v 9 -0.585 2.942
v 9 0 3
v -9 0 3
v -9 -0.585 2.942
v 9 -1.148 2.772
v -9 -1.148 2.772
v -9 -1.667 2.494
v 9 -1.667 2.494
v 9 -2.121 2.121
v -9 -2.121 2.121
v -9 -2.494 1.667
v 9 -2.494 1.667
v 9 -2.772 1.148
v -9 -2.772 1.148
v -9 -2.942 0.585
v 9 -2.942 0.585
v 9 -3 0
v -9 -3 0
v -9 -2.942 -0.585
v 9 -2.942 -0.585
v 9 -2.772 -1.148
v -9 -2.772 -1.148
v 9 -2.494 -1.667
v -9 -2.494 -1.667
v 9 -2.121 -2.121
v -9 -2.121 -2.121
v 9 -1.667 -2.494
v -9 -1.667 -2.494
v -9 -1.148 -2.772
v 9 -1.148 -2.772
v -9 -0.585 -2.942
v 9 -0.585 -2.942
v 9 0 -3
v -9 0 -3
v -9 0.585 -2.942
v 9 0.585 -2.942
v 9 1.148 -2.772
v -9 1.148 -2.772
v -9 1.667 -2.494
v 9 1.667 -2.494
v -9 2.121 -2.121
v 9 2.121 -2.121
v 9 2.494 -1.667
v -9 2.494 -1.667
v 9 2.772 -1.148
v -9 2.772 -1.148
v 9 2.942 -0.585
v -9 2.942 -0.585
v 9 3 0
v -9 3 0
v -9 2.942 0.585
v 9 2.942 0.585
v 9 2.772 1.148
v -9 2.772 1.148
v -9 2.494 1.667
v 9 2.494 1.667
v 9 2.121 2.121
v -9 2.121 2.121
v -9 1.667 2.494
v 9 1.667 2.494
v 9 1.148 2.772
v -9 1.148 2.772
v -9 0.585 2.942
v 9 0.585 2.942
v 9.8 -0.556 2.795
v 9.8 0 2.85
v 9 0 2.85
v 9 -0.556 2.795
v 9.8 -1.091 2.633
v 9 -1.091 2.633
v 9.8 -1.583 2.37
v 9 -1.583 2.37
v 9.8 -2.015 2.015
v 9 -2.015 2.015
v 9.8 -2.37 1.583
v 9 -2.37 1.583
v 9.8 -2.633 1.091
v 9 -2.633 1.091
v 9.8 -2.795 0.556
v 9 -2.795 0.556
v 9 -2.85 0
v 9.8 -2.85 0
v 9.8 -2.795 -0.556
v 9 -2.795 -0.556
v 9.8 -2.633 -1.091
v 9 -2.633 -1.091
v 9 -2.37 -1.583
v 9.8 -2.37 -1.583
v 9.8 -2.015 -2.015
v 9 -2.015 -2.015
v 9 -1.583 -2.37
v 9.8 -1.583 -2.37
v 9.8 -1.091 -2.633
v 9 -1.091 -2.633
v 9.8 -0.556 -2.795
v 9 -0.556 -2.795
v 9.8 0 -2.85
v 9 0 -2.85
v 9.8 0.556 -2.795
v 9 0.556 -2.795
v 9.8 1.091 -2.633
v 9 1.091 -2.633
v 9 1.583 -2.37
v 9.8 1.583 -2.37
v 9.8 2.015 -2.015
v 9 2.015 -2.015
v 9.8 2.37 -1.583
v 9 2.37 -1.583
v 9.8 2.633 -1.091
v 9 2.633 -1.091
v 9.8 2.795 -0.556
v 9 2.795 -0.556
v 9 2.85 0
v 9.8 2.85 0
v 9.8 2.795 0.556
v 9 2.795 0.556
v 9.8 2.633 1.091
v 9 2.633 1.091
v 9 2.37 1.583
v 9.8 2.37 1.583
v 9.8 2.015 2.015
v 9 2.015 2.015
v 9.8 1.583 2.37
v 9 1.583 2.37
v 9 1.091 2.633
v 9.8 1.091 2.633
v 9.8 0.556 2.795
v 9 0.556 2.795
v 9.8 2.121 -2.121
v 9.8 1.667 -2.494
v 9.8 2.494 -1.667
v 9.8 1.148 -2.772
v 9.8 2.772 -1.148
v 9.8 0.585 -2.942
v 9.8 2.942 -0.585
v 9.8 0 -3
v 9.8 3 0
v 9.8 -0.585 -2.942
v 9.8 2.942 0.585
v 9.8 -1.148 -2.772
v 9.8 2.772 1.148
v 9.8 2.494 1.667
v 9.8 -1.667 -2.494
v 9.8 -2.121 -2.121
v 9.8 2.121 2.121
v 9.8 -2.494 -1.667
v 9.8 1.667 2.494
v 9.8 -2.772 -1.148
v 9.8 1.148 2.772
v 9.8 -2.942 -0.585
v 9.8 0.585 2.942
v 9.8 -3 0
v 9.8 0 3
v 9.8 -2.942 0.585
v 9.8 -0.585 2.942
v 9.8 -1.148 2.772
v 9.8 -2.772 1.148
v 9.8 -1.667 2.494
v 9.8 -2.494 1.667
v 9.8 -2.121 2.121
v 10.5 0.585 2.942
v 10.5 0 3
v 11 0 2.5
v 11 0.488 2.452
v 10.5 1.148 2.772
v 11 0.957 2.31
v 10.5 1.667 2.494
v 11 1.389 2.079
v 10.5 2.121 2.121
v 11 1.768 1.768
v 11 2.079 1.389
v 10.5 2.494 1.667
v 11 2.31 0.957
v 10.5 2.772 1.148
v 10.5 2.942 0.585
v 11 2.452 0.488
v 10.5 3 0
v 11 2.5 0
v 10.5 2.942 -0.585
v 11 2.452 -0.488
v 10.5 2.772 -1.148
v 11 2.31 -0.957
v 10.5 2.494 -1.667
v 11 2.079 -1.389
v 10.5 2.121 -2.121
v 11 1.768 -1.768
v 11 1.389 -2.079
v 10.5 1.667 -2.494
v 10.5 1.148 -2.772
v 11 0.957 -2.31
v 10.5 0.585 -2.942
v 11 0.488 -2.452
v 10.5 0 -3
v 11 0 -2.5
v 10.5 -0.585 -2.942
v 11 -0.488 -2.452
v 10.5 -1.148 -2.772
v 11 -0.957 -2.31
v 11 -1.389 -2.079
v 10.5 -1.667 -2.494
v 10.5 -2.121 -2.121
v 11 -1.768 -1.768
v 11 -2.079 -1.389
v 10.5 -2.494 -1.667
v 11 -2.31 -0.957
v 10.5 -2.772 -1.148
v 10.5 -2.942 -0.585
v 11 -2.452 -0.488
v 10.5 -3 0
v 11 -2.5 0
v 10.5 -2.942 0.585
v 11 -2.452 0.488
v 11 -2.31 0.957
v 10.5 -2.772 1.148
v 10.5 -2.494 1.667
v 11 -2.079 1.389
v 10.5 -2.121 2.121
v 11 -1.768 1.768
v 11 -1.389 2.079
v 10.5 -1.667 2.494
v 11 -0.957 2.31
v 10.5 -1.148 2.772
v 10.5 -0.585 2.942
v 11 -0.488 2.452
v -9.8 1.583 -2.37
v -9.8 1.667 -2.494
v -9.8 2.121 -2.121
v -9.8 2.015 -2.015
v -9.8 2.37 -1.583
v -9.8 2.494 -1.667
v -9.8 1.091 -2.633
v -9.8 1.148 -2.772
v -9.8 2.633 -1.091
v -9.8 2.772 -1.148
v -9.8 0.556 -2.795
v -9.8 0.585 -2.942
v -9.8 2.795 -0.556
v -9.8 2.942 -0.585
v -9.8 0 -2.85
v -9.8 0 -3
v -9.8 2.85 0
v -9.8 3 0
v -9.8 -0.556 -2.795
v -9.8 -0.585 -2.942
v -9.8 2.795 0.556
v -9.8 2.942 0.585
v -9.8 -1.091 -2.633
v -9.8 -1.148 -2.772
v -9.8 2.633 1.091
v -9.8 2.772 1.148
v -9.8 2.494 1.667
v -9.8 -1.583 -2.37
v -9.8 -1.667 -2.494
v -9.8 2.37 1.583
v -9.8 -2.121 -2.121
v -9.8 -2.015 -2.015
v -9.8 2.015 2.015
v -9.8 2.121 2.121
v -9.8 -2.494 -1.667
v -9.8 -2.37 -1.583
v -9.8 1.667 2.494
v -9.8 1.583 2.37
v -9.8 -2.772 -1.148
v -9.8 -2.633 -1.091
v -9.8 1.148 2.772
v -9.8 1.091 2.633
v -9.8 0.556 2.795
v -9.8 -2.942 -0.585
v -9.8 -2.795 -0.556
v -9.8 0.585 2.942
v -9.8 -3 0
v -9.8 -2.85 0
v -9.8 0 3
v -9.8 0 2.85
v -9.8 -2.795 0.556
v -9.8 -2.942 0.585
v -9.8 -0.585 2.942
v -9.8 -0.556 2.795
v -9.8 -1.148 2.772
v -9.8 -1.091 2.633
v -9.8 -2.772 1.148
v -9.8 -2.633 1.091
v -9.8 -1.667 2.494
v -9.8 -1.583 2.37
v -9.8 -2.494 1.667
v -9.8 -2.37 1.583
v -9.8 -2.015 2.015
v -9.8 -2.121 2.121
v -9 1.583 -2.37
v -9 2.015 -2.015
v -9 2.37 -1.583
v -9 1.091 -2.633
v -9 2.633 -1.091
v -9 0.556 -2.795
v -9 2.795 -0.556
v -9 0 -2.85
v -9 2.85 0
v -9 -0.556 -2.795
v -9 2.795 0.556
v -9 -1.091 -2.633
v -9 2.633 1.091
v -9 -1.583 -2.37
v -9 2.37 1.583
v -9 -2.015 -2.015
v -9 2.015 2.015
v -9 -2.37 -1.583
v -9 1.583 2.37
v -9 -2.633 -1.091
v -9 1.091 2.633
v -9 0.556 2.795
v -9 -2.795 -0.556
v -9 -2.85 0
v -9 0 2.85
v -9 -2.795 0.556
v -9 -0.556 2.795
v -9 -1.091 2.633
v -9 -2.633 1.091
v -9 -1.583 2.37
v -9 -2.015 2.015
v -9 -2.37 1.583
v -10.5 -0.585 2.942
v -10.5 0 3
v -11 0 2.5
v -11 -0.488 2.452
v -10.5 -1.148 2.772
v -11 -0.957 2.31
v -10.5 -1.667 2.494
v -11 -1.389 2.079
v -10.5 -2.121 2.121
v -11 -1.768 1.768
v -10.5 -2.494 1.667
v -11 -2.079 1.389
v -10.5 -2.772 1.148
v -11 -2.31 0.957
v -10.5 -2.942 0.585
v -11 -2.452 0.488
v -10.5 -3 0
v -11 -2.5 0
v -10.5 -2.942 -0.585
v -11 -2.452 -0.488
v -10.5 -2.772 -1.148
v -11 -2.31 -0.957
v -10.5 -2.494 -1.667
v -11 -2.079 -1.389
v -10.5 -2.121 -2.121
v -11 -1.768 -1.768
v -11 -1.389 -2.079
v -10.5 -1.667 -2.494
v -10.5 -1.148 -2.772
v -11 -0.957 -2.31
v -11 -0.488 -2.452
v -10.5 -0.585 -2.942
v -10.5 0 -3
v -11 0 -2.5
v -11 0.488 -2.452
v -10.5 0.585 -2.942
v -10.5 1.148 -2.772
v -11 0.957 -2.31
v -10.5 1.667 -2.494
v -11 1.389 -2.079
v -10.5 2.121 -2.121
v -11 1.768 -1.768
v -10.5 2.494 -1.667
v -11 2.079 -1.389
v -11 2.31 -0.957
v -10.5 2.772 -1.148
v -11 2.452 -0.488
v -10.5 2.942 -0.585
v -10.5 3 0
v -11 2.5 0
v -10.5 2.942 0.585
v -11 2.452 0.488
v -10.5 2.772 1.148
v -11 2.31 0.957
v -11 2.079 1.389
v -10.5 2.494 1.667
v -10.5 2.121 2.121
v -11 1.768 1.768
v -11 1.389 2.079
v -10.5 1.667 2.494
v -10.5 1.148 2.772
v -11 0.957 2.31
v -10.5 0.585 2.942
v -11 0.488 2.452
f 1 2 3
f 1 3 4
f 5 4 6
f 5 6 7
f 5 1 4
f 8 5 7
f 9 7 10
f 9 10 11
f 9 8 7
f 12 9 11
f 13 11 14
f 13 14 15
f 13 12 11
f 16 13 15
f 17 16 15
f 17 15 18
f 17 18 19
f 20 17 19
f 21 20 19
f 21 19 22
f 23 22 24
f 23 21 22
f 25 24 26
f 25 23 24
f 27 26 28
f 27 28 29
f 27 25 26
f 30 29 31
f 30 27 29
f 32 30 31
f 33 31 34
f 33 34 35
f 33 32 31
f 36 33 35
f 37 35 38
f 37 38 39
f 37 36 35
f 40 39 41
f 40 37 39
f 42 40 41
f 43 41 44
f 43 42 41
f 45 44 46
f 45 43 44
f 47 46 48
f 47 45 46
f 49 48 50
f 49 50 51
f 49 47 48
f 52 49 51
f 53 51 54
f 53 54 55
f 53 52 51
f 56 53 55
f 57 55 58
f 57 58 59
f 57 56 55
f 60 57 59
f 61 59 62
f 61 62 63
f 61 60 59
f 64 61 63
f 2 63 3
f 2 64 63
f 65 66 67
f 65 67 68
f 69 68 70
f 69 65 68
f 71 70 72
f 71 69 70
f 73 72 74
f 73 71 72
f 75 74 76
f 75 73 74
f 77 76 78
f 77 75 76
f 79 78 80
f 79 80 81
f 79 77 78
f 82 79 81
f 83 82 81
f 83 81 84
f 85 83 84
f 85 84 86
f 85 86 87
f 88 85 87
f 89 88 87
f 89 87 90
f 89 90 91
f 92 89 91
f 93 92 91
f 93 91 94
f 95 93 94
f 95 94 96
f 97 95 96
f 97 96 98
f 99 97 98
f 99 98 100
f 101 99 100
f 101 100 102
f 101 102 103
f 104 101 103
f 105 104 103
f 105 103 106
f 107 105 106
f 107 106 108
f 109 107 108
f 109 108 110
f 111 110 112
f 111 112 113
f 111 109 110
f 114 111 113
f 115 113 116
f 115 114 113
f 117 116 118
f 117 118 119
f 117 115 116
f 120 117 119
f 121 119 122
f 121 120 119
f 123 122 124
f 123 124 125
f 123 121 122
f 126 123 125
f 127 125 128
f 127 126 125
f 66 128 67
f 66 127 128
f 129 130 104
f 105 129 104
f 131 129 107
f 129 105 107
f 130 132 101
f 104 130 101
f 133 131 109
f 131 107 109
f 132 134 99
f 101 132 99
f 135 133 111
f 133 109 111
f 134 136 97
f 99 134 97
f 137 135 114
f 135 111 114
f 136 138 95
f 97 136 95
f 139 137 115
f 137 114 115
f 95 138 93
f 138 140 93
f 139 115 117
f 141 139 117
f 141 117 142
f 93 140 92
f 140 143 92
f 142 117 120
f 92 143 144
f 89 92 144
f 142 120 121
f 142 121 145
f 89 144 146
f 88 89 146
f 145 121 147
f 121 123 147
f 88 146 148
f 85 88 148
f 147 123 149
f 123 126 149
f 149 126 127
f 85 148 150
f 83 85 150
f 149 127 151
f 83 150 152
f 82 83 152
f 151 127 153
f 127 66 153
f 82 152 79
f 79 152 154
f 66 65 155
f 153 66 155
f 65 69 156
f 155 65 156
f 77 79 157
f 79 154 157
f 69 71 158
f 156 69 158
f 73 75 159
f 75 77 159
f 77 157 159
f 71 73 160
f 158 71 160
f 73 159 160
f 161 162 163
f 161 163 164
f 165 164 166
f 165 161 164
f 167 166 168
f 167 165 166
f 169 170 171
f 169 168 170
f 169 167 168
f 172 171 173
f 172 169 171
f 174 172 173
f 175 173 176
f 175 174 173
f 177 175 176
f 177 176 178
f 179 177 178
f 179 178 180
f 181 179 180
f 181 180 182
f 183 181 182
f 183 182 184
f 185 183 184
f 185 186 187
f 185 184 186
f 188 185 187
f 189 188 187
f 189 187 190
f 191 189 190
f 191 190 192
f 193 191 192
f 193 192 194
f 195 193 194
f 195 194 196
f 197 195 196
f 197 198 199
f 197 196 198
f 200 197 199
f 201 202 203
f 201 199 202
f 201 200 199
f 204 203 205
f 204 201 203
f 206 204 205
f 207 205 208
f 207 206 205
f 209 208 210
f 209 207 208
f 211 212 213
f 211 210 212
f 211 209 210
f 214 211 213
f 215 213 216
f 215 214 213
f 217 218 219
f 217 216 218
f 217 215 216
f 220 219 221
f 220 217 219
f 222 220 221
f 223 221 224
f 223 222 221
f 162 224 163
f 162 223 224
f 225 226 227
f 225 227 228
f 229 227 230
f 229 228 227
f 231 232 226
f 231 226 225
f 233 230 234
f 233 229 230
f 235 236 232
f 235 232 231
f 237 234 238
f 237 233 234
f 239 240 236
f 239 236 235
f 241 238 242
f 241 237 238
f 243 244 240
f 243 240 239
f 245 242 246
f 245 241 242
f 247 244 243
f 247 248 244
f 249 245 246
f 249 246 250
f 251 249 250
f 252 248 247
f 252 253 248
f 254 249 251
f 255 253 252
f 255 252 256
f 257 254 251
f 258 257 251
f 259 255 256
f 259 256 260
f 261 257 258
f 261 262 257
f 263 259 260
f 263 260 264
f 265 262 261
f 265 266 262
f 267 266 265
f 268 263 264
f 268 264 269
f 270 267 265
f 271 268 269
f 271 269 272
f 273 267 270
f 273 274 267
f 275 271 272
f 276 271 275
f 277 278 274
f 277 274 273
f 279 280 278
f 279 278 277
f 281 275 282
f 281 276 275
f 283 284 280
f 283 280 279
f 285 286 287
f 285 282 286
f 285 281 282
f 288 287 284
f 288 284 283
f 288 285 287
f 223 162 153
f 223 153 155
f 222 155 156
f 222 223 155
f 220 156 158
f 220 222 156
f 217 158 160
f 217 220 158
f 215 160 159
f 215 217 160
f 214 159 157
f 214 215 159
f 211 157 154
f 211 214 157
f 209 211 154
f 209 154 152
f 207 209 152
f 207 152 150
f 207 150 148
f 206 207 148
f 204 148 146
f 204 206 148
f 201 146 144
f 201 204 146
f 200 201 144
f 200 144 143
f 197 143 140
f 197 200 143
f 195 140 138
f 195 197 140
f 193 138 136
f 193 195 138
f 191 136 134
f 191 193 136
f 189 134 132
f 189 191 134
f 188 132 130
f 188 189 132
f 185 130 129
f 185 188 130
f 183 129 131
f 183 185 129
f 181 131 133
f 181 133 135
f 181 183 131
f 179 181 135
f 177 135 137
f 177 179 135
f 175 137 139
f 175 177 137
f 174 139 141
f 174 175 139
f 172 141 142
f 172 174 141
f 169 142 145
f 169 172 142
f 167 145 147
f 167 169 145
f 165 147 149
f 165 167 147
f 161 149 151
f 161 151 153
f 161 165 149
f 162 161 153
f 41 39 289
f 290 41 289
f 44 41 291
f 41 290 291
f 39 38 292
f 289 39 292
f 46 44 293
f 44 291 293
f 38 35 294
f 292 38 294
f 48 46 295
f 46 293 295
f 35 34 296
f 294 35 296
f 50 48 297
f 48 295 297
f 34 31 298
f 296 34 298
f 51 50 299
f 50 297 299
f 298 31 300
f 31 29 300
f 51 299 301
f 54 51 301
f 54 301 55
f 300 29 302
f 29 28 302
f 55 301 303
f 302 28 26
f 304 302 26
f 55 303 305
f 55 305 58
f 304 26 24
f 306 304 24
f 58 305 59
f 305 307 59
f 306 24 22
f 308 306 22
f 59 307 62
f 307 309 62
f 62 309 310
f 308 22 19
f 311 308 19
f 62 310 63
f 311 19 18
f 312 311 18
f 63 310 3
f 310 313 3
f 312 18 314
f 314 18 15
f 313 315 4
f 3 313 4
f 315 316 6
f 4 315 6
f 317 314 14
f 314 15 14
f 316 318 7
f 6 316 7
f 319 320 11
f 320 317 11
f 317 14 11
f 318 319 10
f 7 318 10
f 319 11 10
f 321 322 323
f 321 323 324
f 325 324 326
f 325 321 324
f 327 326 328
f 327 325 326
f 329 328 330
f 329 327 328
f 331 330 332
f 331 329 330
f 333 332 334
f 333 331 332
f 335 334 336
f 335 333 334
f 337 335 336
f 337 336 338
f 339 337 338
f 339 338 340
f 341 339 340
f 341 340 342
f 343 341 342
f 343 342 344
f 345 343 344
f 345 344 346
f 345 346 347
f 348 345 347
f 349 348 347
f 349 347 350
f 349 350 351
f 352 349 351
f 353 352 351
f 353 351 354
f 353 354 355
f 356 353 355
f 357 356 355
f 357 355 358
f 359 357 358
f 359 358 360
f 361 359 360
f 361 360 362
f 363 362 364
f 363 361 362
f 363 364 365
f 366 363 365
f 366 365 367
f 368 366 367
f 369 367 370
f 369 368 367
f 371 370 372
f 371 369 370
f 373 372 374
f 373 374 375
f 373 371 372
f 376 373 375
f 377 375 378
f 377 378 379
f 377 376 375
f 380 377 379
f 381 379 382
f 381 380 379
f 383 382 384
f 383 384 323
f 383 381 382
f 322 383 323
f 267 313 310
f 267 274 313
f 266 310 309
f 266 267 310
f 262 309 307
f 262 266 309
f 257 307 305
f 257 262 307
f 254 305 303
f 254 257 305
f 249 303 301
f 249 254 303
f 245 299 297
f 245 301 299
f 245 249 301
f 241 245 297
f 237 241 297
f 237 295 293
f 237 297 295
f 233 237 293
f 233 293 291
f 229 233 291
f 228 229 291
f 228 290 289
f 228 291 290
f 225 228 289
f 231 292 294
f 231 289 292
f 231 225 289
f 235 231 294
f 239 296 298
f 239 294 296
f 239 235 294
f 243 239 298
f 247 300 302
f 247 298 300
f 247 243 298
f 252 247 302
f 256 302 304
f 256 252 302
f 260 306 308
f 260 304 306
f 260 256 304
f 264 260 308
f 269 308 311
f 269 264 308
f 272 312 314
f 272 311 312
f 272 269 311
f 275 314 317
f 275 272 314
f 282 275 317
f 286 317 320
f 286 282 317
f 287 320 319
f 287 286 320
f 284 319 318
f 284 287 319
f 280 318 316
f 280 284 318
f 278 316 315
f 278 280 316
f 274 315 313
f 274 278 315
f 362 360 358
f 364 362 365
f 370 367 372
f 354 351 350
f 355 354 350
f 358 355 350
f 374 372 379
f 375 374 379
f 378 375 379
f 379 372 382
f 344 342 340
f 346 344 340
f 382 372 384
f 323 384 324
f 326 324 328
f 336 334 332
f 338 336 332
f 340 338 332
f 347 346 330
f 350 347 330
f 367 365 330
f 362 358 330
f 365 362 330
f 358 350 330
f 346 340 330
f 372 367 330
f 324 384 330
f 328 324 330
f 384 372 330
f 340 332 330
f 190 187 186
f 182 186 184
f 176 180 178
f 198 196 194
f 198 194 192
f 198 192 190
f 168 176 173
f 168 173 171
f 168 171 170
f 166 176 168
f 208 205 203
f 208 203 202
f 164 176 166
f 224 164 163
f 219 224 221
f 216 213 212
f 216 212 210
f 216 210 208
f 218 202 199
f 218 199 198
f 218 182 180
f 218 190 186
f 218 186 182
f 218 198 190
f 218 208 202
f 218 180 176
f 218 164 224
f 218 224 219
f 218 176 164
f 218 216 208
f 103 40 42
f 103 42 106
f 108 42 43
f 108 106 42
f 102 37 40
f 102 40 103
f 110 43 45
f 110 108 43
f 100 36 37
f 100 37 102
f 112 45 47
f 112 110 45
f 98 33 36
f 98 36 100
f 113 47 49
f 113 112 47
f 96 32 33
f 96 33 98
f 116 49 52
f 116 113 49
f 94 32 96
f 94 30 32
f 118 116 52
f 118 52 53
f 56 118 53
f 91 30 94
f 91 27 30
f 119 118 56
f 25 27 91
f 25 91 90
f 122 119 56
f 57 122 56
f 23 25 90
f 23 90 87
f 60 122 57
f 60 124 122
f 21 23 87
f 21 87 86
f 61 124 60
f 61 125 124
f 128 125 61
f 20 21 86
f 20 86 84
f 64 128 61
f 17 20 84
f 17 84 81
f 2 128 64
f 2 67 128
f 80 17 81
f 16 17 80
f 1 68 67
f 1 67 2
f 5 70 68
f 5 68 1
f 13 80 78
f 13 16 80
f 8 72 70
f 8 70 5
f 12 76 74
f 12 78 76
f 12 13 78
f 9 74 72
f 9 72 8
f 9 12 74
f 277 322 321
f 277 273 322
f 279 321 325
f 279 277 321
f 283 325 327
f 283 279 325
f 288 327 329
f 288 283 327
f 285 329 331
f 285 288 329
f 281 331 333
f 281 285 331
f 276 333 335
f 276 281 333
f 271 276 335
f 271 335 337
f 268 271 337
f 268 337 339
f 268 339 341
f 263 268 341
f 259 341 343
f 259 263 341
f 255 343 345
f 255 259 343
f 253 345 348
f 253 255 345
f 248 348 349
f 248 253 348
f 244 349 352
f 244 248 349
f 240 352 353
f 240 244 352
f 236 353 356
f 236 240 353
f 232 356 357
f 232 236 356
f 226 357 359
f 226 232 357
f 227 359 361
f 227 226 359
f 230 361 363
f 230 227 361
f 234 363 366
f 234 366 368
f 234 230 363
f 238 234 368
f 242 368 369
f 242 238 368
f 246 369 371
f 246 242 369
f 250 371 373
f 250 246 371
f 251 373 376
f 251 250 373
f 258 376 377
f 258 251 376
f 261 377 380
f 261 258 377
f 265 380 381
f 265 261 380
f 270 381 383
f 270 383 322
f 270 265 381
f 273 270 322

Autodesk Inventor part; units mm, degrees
ref_plane "YZ Plane" through (0, 0, 0) normal (1, 0, 0) x (0, 1, 0)
ref_plane "XZ Plane" through (0, 0, 0) normal (0, 1, 0) x (-1, 0, 0)
ref_plane "XY Plane" through (0, 0, 0) normal (0, 0, 1) x (1, 0, 0)
sketch "Skizze2" plane through (0, 0, 0) normal (0, 1, 0) x (-1, 0, 0)
  line L0 (15.4, 0) -> (-15.4, 0) projected
  line L1 (0, -0.6) -> (0, 3.6) projected
  line L2 (-11, 0) -> (11, 0)
  line L3 (11, 0) -> (11, 2.5)
  line L4 (-11, 2.5) -> (-11, 0)
  line L5 (-9, 3) -> (-9, 2.85)
  line L6 (-9, 2.85) -> (-9.8, 2.85)
  line L7 (-9.8, 2.85) -> (-9.8, 3)
  line L8 (9, 3) -> (9, 2.85)
  line L9 (9, 2.85) -> (9.8, 2.85)
  line L10 (9.8, 2.85) -> (9.8, 3)
  line L11 (-9.8, 3) -> (-10.5, 3)
  line L12 (10.5, 3) -> (9.8, 3)
  line L13 (9, 3) -> (-9, 3)
  line L14 (-11, 2.5) -> (-10.5, 3)
  line L15 (11, 2.5) -> (10.5, 3)
  point P0 (0, 0)
  point P1 (11, 3)
  point P2 (-11, 3)
  dimension "d3" = 6
  dimension "d4" = 5.7
  dimension "d5" = 22
  dimension "d6" = 18
  dimension "d7" = 0.8
  dimension "d8" = 0.5
  dimension "d9" = 0.5
  dimension "d10" = 0.5
  dimension "d11" = 0.5
revolve "Umdrehung1" add sketch "Skizze2" angle 360 about axis through (-10, 0, 0) along (1, 0, 0)
equation "\"d9\" = d8"
equation "\"d10\" = d8"
equation "\"d11\" = d10"
properties part number "13_0204_054"
